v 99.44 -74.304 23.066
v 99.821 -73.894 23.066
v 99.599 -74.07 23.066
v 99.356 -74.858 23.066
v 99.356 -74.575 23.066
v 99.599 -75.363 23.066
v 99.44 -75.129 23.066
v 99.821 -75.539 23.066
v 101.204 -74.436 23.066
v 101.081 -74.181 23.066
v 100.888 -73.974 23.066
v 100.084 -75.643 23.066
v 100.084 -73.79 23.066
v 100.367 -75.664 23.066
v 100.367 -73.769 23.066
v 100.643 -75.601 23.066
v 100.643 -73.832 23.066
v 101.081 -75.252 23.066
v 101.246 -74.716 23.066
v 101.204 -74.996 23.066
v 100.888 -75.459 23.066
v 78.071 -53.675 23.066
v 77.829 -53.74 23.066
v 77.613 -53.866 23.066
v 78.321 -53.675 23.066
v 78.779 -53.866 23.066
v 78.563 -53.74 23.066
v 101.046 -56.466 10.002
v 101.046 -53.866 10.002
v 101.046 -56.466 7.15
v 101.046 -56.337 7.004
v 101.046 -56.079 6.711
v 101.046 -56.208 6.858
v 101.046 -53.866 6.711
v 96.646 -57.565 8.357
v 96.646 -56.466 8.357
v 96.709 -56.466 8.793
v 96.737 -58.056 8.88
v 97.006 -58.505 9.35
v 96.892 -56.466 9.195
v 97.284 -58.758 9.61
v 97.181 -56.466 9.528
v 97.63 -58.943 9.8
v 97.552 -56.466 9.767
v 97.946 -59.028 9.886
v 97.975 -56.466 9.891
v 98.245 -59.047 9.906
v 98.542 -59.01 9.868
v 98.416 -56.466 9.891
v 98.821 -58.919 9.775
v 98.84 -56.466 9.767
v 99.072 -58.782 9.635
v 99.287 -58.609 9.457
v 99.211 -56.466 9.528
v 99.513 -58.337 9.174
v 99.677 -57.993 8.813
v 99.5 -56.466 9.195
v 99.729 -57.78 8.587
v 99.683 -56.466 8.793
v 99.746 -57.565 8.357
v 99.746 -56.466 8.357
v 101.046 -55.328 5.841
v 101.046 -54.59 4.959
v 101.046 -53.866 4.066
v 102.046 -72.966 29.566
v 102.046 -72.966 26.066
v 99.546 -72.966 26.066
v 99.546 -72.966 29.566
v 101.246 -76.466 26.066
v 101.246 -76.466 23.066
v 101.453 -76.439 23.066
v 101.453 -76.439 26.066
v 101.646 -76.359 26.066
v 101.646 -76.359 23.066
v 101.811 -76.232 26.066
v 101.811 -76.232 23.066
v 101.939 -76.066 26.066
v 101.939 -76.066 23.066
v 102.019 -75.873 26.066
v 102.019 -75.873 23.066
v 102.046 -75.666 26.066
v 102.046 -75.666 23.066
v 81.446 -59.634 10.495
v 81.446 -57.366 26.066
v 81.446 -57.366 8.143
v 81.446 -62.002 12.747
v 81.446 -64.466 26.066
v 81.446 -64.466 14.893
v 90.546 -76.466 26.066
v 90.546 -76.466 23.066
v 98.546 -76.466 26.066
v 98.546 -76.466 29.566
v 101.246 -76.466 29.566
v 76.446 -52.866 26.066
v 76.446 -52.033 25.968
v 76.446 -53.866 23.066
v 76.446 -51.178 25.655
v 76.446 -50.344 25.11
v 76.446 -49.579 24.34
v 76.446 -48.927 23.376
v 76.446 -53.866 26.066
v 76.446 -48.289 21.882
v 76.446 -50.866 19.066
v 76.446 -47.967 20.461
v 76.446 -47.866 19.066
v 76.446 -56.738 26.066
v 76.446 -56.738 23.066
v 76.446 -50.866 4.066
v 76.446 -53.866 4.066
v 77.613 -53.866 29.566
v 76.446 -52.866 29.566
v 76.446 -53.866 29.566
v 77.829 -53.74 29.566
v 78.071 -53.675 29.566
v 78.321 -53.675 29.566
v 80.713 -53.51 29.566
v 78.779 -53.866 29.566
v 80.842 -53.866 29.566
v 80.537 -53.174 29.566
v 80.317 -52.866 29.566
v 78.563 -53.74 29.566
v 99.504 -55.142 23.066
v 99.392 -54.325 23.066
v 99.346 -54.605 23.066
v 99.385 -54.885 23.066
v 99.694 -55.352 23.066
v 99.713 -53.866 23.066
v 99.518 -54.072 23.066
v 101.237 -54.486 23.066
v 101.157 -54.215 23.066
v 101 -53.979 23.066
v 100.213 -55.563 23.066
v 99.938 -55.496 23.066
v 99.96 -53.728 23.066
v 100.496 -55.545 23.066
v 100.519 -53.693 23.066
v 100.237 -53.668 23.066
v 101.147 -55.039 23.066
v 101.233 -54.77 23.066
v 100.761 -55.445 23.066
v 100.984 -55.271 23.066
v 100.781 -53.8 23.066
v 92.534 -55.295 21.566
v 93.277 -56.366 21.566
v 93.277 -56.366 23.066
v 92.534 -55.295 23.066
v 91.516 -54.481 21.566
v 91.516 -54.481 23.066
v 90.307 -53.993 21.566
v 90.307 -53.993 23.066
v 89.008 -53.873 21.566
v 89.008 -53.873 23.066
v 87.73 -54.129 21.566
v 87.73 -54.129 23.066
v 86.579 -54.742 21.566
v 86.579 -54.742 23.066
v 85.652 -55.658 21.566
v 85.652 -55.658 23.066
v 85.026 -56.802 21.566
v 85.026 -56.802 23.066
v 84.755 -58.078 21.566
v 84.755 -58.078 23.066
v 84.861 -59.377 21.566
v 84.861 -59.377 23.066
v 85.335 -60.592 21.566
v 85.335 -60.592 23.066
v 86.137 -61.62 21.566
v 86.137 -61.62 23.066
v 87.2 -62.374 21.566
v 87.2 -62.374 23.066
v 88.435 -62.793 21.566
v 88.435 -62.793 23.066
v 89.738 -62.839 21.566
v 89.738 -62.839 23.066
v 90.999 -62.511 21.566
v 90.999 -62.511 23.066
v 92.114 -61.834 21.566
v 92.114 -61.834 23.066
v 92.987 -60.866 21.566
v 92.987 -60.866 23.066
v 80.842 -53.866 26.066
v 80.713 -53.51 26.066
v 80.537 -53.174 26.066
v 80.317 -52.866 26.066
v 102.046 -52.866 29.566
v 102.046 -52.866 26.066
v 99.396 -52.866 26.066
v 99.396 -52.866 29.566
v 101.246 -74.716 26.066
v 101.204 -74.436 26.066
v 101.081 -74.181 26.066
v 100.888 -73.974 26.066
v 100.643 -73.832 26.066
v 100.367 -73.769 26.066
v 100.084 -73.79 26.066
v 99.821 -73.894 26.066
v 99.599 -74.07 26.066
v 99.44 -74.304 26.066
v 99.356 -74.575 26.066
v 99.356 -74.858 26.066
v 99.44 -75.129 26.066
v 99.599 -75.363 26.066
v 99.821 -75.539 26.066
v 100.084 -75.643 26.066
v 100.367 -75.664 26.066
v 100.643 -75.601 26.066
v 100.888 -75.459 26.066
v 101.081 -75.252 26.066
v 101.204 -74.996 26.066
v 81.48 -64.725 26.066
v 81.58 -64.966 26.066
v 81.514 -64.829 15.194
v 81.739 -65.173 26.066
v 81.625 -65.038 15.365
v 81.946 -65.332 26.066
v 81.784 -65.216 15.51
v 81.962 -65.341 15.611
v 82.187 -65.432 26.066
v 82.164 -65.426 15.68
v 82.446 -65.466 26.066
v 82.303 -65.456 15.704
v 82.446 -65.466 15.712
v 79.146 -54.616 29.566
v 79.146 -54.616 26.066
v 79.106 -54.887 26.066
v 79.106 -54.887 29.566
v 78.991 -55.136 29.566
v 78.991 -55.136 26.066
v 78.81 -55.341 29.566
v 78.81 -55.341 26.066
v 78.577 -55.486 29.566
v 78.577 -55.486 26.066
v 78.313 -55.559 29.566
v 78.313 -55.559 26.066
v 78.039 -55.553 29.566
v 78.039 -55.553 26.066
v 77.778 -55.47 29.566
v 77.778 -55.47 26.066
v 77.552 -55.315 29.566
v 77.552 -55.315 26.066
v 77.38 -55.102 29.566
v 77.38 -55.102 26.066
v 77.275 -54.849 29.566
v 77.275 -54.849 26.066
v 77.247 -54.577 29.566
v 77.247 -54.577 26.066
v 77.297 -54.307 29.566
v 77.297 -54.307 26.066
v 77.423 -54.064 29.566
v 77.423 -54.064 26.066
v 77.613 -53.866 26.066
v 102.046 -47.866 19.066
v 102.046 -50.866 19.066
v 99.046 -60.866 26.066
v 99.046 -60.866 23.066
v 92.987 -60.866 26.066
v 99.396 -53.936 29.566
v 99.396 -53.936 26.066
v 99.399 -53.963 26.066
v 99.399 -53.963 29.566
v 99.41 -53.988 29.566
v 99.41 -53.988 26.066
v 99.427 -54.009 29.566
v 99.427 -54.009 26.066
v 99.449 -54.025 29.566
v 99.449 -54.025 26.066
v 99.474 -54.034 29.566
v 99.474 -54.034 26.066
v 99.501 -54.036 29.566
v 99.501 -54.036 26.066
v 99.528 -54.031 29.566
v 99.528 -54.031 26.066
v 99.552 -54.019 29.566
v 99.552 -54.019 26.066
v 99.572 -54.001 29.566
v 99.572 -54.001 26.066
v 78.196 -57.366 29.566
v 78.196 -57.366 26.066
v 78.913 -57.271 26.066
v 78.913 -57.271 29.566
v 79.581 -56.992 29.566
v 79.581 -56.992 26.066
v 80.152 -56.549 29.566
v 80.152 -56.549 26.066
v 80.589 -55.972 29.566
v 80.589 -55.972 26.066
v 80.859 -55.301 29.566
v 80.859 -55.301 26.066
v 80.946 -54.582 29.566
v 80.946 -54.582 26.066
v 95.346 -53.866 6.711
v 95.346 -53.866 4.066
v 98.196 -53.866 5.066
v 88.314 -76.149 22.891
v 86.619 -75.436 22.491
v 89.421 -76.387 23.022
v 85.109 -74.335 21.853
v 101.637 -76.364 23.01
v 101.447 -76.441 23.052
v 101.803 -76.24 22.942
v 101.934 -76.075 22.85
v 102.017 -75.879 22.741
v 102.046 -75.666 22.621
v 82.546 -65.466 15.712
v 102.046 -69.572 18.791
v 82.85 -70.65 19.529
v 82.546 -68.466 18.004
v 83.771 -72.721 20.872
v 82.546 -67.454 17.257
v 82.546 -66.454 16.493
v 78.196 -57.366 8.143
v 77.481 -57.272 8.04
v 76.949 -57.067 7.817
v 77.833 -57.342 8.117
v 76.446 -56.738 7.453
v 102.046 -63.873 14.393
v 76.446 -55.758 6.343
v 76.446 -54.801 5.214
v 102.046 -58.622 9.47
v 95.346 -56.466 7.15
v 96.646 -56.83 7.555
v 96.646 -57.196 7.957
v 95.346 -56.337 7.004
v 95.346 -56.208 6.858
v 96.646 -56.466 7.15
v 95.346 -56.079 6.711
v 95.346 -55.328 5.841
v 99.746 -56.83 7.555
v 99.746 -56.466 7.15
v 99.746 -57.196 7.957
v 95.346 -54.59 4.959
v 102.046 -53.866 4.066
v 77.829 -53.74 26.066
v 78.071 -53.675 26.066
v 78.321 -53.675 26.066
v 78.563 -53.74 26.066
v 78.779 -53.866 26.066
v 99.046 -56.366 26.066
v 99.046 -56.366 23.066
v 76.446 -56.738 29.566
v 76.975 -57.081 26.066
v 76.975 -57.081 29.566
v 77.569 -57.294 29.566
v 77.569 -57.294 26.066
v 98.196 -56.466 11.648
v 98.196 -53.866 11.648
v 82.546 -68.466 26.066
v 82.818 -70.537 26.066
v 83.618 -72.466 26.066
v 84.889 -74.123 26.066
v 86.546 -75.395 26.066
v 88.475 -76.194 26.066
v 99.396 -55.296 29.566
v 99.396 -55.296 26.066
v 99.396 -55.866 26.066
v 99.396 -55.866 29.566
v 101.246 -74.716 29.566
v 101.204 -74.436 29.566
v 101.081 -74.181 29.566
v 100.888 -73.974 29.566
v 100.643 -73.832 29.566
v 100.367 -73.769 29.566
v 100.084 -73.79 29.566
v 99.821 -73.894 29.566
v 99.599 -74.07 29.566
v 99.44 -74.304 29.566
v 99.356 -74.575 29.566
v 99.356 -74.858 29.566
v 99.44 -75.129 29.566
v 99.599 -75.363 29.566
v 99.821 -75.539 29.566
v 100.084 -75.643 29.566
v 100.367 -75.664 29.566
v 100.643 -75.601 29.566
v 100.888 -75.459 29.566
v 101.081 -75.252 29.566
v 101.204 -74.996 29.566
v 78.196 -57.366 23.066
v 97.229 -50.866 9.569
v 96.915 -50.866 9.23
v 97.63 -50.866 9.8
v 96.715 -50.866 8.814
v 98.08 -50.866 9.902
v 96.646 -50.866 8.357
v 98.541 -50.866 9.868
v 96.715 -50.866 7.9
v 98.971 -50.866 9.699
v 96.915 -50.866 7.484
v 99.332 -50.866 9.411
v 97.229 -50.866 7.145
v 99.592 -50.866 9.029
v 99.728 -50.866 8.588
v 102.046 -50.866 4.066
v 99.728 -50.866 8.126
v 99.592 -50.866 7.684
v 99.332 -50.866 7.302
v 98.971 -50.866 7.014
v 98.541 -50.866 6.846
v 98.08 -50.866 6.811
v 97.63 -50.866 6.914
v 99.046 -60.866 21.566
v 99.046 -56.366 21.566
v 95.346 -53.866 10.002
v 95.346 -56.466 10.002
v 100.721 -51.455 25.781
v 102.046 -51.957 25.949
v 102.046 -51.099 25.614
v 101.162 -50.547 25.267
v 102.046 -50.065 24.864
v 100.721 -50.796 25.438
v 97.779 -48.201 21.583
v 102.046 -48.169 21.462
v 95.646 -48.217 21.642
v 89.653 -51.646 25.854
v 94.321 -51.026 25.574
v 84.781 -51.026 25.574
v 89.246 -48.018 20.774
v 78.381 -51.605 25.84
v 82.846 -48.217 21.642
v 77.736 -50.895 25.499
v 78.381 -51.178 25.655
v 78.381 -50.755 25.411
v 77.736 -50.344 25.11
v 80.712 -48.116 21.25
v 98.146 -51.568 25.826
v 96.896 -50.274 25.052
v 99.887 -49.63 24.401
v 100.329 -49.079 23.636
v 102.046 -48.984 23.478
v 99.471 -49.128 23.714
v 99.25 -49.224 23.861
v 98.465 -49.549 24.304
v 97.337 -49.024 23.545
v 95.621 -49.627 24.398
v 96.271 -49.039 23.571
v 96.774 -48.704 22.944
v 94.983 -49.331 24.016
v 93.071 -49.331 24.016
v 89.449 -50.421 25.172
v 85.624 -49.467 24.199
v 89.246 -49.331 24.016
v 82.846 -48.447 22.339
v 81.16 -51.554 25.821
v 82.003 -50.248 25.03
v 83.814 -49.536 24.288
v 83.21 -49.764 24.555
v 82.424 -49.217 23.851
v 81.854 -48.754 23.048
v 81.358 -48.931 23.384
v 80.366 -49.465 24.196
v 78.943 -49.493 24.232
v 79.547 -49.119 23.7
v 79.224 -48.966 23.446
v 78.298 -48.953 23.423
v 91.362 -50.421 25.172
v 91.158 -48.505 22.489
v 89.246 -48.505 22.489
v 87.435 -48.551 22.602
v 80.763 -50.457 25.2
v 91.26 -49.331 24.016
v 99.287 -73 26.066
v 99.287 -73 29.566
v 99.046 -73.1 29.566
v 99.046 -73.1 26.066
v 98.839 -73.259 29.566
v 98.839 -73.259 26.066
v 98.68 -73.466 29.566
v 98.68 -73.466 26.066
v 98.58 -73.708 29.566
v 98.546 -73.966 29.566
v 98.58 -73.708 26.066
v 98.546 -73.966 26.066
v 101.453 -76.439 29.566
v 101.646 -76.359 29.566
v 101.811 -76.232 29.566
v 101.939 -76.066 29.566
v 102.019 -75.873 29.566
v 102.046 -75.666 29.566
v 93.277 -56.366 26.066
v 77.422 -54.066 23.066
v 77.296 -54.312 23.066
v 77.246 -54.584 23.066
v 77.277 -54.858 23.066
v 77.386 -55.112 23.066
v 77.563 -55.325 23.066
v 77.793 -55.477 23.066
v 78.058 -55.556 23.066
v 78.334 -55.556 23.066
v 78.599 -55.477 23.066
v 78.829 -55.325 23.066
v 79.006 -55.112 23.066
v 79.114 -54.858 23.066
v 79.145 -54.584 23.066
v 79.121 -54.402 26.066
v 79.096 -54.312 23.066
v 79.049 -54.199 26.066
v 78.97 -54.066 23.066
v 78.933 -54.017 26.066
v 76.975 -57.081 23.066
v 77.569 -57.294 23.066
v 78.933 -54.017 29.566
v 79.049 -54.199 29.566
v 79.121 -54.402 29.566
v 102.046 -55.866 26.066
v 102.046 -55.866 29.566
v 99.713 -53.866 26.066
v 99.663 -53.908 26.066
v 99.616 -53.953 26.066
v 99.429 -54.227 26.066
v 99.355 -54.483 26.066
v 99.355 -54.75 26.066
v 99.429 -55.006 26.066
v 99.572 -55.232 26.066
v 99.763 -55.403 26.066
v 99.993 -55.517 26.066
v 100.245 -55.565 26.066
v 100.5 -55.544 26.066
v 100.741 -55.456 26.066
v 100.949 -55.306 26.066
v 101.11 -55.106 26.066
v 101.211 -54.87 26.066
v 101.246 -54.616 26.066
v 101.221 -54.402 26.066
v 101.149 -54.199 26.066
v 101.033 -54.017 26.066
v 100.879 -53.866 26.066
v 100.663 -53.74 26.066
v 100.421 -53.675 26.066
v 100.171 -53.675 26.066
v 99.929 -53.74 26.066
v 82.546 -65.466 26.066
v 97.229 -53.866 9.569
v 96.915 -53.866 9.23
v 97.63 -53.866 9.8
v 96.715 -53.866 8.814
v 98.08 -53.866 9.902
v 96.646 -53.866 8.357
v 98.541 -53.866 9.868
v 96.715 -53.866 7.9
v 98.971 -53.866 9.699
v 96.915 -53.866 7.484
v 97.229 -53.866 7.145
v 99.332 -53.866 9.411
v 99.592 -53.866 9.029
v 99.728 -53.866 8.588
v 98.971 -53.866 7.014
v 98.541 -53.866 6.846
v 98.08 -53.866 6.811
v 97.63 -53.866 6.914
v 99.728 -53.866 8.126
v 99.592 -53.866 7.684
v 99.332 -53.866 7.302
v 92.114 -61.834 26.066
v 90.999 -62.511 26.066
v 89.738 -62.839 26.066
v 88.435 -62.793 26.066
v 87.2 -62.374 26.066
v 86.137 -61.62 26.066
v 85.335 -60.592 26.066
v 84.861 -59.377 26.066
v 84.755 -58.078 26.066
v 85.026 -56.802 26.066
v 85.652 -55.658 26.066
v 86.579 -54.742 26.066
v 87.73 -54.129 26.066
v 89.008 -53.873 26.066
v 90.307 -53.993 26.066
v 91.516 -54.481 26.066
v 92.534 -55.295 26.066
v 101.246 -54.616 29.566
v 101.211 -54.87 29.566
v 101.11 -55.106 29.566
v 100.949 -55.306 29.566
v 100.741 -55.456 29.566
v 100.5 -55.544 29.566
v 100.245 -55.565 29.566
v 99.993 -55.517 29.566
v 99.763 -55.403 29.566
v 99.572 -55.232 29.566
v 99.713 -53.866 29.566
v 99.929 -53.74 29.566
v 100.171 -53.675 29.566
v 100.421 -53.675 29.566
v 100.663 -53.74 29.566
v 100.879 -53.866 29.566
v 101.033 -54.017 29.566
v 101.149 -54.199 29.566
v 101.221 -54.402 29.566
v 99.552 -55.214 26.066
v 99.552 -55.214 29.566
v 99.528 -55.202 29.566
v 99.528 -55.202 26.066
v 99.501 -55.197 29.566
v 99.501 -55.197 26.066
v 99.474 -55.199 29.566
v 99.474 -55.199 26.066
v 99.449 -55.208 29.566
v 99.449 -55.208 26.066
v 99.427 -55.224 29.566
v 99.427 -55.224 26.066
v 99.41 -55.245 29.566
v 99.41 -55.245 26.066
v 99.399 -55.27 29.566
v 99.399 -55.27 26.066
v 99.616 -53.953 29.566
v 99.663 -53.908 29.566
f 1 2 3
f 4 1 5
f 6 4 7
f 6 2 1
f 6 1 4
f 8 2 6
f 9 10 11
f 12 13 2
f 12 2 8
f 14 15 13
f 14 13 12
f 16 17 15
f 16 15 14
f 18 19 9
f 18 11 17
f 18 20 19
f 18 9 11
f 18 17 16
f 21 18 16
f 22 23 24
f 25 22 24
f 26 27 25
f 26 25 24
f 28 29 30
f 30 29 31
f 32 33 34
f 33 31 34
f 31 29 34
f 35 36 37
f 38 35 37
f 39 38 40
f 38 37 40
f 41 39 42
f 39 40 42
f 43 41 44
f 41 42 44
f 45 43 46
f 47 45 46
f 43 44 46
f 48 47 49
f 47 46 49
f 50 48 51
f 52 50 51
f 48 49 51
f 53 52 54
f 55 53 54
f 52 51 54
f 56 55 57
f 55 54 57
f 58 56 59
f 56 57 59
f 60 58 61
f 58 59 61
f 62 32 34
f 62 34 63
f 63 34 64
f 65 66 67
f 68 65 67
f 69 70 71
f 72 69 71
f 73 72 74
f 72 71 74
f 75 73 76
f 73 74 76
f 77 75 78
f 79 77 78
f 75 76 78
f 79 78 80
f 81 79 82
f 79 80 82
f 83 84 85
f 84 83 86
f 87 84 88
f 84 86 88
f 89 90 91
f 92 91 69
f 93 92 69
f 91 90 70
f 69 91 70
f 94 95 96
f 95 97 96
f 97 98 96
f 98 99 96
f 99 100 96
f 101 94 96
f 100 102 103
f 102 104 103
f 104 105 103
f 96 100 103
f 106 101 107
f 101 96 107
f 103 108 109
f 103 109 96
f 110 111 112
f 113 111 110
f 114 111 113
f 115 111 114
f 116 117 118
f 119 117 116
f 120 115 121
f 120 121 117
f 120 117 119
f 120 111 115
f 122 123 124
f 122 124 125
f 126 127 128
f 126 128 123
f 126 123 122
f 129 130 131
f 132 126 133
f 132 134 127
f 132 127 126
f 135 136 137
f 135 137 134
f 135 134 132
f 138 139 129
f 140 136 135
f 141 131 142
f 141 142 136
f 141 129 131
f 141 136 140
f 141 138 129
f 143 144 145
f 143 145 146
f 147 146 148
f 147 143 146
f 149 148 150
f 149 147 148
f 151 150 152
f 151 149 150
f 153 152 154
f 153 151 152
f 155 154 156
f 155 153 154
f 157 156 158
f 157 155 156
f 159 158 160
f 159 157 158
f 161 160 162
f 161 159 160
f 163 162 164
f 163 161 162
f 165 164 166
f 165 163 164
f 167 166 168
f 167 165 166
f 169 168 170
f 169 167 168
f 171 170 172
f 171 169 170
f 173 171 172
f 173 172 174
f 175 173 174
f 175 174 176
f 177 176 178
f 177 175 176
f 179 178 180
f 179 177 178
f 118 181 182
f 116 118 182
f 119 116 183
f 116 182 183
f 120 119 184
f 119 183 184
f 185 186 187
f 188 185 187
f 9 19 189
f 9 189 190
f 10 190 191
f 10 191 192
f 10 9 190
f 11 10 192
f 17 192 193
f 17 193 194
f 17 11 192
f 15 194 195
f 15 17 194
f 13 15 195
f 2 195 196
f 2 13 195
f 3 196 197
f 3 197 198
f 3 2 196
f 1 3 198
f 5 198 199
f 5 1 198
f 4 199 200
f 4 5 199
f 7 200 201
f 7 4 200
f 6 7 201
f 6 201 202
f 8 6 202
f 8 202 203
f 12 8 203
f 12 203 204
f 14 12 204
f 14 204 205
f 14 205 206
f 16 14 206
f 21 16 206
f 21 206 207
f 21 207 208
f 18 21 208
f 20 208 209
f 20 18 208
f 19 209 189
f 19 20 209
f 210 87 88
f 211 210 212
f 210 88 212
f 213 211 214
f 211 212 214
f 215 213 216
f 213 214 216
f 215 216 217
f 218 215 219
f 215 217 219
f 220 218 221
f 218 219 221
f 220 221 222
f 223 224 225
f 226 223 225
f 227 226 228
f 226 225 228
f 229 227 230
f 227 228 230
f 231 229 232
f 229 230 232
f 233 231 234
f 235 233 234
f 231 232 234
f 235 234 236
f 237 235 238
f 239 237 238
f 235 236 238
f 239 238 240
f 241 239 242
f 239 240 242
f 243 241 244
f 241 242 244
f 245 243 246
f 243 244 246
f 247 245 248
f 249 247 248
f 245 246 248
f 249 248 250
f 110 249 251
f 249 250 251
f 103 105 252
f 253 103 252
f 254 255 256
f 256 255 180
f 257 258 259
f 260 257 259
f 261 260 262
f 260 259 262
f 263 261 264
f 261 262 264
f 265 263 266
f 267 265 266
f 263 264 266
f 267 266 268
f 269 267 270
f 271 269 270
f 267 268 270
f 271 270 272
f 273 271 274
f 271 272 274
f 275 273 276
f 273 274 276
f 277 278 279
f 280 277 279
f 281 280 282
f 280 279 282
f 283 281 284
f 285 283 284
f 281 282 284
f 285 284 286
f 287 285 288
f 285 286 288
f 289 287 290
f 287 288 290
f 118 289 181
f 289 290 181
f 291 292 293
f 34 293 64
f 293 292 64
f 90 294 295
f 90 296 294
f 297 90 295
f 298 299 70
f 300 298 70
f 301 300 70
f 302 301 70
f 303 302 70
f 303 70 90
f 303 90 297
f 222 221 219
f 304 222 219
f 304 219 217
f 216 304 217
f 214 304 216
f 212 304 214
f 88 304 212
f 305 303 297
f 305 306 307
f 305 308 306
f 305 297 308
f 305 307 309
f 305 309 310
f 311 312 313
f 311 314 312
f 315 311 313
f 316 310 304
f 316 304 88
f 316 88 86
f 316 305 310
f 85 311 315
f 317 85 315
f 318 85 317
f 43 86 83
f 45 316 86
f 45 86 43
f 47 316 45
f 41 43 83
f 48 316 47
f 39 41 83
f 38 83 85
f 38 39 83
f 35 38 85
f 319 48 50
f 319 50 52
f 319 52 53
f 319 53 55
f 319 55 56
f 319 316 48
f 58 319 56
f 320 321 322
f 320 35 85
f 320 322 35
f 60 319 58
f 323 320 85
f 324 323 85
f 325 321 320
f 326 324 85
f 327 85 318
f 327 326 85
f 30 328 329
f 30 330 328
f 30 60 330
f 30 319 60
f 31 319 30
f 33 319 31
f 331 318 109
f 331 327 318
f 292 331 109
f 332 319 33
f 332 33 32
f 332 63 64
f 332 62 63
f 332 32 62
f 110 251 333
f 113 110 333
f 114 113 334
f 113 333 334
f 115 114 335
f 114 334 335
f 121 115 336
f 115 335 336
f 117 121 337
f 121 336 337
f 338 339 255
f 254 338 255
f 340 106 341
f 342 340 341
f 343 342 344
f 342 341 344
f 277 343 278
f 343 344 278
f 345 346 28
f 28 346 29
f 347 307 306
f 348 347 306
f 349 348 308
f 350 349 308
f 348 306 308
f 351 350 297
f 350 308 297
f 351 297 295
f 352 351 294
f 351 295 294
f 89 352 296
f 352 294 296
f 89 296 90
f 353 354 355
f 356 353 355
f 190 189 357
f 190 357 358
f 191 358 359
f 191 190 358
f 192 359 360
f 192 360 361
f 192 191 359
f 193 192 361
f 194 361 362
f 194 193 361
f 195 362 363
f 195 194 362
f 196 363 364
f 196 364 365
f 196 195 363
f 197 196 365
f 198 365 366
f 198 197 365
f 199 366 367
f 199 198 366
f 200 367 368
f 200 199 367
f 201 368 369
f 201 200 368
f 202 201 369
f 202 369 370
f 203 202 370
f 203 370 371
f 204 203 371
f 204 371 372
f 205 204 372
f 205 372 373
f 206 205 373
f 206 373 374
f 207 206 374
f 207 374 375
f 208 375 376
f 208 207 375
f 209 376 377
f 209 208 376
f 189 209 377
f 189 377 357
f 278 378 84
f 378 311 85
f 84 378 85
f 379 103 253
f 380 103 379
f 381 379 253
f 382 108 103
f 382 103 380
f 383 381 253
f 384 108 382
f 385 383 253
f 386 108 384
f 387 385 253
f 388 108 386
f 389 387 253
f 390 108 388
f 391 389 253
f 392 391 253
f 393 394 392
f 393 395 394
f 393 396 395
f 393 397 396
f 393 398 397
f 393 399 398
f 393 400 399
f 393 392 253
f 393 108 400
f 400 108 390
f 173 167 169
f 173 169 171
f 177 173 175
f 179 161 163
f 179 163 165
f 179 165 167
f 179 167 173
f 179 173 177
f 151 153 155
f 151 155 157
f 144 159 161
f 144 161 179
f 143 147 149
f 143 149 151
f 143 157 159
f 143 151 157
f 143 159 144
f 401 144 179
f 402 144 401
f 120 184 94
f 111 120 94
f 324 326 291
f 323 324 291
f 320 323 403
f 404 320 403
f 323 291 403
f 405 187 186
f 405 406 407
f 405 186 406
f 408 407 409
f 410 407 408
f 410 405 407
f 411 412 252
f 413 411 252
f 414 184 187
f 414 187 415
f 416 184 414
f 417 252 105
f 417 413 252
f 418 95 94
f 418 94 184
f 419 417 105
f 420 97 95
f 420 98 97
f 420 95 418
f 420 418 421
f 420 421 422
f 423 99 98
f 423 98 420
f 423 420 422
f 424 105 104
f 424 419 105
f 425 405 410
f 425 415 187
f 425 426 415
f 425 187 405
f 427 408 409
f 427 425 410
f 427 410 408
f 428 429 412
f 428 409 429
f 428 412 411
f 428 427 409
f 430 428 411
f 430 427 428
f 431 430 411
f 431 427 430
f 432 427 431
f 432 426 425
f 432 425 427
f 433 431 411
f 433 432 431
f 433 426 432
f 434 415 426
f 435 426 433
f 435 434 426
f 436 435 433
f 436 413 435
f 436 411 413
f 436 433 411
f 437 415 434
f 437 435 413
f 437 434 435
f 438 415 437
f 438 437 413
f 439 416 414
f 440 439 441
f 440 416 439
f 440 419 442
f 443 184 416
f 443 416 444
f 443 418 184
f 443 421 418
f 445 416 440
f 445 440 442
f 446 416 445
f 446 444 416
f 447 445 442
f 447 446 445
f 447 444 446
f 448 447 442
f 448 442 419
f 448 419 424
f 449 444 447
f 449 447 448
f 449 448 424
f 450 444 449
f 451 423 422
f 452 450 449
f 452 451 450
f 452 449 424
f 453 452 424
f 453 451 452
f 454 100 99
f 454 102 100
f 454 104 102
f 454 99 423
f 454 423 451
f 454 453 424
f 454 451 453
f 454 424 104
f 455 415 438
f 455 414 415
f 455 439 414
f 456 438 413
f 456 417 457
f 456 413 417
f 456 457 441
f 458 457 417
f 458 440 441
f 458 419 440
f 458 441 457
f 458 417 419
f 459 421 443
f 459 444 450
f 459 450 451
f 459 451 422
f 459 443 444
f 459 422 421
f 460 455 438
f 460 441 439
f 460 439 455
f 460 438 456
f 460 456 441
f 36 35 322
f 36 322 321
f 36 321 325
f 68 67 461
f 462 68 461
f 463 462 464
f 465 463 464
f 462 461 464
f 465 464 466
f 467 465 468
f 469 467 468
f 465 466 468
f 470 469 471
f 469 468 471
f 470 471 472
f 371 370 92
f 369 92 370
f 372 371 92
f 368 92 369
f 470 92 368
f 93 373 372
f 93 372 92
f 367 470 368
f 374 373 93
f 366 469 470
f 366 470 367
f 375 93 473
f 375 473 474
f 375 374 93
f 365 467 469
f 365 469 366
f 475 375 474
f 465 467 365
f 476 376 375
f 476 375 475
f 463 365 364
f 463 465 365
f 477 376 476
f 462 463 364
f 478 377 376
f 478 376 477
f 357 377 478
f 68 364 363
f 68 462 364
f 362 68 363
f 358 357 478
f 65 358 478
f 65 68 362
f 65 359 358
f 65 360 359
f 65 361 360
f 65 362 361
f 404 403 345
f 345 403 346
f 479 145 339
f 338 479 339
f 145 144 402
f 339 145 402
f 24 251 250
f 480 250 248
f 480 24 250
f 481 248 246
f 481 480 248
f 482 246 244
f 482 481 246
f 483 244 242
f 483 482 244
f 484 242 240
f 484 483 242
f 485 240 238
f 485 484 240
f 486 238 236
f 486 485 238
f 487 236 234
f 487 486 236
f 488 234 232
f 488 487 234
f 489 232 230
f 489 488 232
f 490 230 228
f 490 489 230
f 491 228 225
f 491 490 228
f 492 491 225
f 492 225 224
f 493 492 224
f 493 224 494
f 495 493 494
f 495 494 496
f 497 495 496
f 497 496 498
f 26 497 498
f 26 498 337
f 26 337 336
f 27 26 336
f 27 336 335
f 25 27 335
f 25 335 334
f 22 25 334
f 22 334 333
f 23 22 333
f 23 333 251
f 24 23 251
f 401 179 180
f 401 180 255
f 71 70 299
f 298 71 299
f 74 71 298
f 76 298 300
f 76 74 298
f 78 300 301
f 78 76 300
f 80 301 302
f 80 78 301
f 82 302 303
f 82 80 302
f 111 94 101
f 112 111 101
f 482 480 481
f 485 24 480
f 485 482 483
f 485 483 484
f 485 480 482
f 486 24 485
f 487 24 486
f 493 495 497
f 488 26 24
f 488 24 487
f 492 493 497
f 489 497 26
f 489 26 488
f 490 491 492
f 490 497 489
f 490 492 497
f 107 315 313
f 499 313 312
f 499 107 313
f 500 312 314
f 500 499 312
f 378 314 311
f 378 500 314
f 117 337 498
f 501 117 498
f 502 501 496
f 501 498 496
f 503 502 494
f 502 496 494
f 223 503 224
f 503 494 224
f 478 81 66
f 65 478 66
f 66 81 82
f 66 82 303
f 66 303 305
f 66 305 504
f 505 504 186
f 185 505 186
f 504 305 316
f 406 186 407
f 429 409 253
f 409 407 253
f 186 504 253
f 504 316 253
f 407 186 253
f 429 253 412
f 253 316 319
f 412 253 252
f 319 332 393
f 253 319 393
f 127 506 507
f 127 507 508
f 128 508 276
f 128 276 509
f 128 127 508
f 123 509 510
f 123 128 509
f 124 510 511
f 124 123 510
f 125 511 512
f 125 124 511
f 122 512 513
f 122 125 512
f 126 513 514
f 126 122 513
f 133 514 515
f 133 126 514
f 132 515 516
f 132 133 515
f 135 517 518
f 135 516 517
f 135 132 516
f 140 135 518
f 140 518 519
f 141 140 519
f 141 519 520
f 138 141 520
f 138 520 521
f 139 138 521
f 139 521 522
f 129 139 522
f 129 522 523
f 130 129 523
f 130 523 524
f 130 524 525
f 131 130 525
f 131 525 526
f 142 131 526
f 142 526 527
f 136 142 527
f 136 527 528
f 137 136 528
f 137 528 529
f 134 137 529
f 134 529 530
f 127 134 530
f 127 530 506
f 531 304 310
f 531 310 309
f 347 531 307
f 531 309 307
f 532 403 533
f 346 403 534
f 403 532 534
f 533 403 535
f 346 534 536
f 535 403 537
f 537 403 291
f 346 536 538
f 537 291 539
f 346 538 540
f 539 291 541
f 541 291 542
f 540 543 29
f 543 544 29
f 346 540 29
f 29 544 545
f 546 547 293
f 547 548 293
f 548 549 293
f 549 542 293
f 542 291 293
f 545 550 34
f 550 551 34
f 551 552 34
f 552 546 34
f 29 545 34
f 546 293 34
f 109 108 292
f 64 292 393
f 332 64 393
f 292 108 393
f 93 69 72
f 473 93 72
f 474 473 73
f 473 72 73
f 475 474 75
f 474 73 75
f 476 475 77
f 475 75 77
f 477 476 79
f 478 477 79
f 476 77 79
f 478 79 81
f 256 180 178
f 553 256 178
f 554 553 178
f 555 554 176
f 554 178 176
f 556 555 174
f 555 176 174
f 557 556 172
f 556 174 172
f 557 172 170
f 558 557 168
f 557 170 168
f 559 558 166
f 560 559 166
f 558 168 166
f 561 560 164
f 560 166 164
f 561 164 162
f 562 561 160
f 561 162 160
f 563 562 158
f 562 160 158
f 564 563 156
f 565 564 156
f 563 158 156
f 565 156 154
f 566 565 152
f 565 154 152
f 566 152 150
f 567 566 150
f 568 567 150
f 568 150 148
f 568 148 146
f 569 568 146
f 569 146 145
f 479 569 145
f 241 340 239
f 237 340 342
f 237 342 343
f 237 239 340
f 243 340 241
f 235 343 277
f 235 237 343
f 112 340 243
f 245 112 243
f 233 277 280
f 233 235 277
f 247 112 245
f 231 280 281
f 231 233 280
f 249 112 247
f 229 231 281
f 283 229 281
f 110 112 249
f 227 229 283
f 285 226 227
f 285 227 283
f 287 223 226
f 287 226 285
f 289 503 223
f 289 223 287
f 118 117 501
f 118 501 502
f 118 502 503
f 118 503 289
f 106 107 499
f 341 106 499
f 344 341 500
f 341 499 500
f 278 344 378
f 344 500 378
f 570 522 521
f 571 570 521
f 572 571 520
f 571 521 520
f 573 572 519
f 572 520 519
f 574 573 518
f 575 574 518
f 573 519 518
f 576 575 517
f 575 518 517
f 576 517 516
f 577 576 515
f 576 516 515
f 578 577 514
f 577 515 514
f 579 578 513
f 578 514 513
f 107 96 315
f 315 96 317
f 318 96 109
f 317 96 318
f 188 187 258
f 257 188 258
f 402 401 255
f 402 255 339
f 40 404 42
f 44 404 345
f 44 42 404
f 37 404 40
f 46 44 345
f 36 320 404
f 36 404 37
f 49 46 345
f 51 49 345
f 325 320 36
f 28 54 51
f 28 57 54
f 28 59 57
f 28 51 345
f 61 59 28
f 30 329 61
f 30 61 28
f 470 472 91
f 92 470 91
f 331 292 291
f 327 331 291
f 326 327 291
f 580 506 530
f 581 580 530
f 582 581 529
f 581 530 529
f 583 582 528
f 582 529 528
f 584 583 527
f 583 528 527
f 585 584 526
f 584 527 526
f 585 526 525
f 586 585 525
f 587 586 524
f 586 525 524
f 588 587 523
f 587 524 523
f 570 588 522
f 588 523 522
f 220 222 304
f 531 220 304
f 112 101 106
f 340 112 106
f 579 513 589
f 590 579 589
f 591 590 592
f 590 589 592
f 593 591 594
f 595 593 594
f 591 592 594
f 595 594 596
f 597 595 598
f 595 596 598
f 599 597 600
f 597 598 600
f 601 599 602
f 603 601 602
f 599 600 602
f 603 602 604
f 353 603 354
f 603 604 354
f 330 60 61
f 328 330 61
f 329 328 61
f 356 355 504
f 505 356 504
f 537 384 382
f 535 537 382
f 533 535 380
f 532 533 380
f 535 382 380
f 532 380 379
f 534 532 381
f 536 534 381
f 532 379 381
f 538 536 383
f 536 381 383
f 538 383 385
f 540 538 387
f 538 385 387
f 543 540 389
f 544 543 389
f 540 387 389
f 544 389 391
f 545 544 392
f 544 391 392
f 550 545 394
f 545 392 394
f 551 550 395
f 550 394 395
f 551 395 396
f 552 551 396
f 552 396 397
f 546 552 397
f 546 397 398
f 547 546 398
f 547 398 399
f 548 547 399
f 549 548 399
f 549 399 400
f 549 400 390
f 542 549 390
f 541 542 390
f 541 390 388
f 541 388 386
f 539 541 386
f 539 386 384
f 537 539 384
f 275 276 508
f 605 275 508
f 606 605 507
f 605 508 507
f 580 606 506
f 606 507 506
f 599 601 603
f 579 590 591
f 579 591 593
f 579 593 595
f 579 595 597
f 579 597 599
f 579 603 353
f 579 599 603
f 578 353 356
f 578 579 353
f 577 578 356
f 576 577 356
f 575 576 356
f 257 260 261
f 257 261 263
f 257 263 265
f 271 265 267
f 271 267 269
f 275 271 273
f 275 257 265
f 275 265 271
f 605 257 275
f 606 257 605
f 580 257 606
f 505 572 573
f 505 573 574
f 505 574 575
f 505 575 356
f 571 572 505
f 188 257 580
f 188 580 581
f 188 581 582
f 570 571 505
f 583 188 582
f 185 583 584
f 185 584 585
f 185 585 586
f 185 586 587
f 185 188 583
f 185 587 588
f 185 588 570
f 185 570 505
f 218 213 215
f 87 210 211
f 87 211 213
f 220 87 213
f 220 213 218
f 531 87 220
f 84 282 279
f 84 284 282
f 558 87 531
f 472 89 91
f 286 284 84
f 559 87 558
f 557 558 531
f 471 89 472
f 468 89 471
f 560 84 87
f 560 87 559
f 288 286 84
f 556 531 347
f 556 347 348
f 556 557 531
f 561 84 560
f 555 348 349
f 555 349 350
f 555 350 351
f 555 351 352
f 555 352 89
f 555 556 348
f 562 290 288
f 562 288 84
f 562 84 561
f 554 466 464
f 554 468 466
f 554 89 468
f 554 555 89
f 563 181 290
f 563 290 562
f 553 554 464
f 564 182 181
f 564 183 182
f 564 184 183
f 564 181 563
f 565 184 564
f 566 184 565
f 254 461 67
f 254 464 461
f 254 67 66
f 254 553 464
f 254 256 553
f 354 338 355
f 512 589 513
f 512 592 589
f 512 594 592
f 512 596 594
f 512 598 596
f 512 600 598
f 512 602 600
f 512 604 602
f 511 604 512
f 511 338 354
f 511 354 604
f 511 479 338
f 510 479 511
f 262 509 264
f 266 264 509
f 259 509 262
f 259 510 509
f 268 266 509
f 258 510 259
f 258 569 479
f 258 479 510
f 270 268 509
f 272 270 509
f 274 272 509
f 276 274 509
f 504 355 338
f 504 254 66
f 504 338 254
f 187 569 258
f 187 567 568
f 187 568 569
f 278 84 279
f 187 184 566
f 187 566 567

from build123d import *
from build123d.topology import SkipClean

# Parameters (mm, degrees)
BOSS_EXTRUDE1_START     = -15
BOSS_EXTRUDE1_OUTLINE_W = 25.6
BOSS_EXTRUDE1_OUTLINE_H = 3
BOSS_EXTRUDE1_DEPTH     = 15
SKETCH2_4_W             = 25.6
SKETCH2_4_H             = 6
BOSS_EXTRUDE2_DEPTH     = 4
BOSS_EXTRUDE6_START     = 4
SKETCH2_6_R             = 0.95
BOSS_EXTRUDE6_DEPTH     = 3
BOSS_EXTRUDE7_START     = 7
SKETCH2_7_R             = 0.95
BOSS_EXTRUDE7_DEPTH     = 3.5
BOSS_EXTRUDE8_START     = -25.6
BOSS_EXTRUDE8_DEPTH     = 25.6
CUT_EXTRUDE1_REACH      = 130.924
CUT_EXTRUDE1_END_RADIUS = 75
CUT_EXTRUDE2_START      = -1.5
CUT_EXTRUDE2_DEPTH      = 1.5
CUT_EXTRUDE3_REACH      = 87.887
CUT_EXTRUDE4_REACH      = 111.283
CUT_EXTRUDE4_END_RADIUS = 75
SKETCH6_R               = 1.55
CUT_EXTRUDE5_START      = -3
SKETCH6_4_R             = 1.55
CUT_EXTRUDE5_DEPTH      = 2.6
CUT_EXTRUDE6_START      = -1.098342
SKETCH7_W               = 3.1
SKETCH7_H               = 1.207100643
CUT_EXTRUDE6_DEPTH      = 1.098342


# Read off the part's stored shape, not the designer's step: Boss-Extrude1
with BuildPart() as part:
    # Boss-Extrude1 outline → Boss-Extrude1 (new body)
    with BuildSketch(Plane.XY.offset(19.065792005).offset(BOSS_EXTRUDE1_START)):
        with Locations((89.245789569, -52.366374711)):
            Rectangle(BOSS_EXTRUDE1_OUTLINE_W, BOSS_EXTRUDE1_OUTLINE_H)
    extrude(amount=BOSS_EXTRUDE1_DEPTH)

    # Sketch2<4> → Boss-Extrude2 (add)
    with BuildSketch(Plane.XY.offset(19.065792005)):
        with Locations((89.245789569, -50.866374711)):
            Rectangle(SKETCH2_4_W, SKETCH2_4_H)
    extrude(amount=BOSS_EXTRUDE2_DEPTH)

    # Sketch2<6> → Boss-Extrude6 (add)
    with BuildSketch(Plane.XY.offset(19.065792005).offset(BOSS_EXTRUDE6_START)):
        with BuildLine():
            ThreePointArc((76.445789569, -56.737695055), (77.266039857, -57.204436819), (78.195789569, -57.366374711))
            Line((78.195789569, -57.366374711), (81.445789569, -57.366374711))
            Line((81.445789569, -57.366374711), (81.445789569, -64.466374711))
            ThreePointArc((81.445789569, -64.466374711), (81.738682788, -65.173481493), (82.445789569, -65.466374711))
            Line((82.445789569, -65.466374711), (82.545789569, -65.466374711))
            Line((82.545789569, -65.466374711), (82.545789569, -68.466374711))
            ThreePointArc((82.545789569, -68.466374711), (84.88893532, -74.123228961), (90.545789569, -76.466374711))
            Line((90.545789569, -76.466374711), (101.245789569, -76.466374711))
            ThreePointArc((101.245789569, -76.466374711), (101.811474994, -76.232060136), (102.045789569, -75.666374711))
            Line((102.045789569, -75.666374711), (102.045789569, -47.866374711))
            Line((102.045789569, -47.866374711), (76.445789569, -47.866374711))
            Line((76.445789569, -47.866374711), (76.445789569, -56.737695055))
        make_face()
        with Locations(Location((100.295789569, -54.616374711, 0), (0, 0, 127.863646362))):
            Circle(SKETCH2_6_R, mode=Mode.SUBTRACT)
        with Locations(Location((78.195789569, -54.616374711, 0), (0, 0, 127.863646362))):
            Circle(SKETCH2_6_R, mode=Mode.SUBTRACT)
        with BuildLine():
            Line((99.045789569, -56.366374711), (99.045789569, -60.866374711))
            Line((99.045789569, -60.866374711), (92.987446956, -60.866374711))
            ThreePointArc((92.987446956, -60.866374711), (84.75507119, -58.077500283), (93.276918444, -56.366374711))
            Line((93.276918444, -56.366374711), (99.045789569, -56.366374711))
        make_face(mode=Mode.SUBTRACT)
        with Locations((100.295789569, -74.716374711)):
            Circle(SKETCH2_6_R, mode=Mode.SUBTRACT)
    extrude(amount=BOSS_EXTRUDE6_DEPTH)

    # Sketch2<7> → Boss-Extrude7 (add)
    # profile 1 of 6: a face of its own
    with SkipClean():  # the faces are left unmerged after this step: merging them gives an invalid solid
        with BuildSketch(Plane.XY.offset(19.065792005).offset(BOSS_EXTRUDE7_START)):
            with BuildLine():
                ThreePointArc((78.195789569, -57.366374711), (80.389530666, -56.274687107), (80.84154088, -53.866374711))
                Line((80.84154088, -53.866374711), (78.778884759, -53.866374711))
                ThreePointArc((78.778884759, -53.866374711), (79.049147768, -54.198906407), (79.145789569, -54.616374711))
                ThreePointArc((79.145789569, -54.616374711), (77.778321265, -55.46973291), (77.61269438, -53.866374711))
                Line((77.61269438, -53.866374711), (76.445789569, -53.866374711))
                Line((76.445789569, -53.866374711), (76.445789569, -56.737695055))
                ThreePointArc((76.445789569, -56.737695055), (77.266039857, -57.204436819), (78.195789569, -57.366374711))
            make_face()
        # profile 2 of 6: a face of its own
        with BuildSketch(Plane.XY.offset(19.065792005).offset(BOSS_EXTRUDE7_START)):
            with BuildLine():
                Line((78.778884759, -53.866374711), (80.84154088, -53.866374711))
                ThreePointArc((80.84154088, -53.866374711), (80.631203916, -53.339168009), (80.317109913, -52.866374711))
                Line((80.317109913, -52.866374711), (76.445789569, -52.866374711))
                Line((76.445789569, -52.866374711), (76.445789569, -53.866374711))
                Line((76.445789569, -53.866374711), (77.61269438, -53.866374711))
                ThreePointArc((77.61269438, -53.866374711), (78.195789569, -53.666374711), (78.778884759, -53.866374711))
            make_face()
        # profile 3 of 6: a face of its own
        with BuildSketch(Plane.XY.offset(19.065792005).offset(BOSS_EXTRUDE7_START)):
            with BuildLine():
                Line((102.045789569, -53.866374711), (100.878884759, -53.866374711))
                ThreePointArc((100.878884759, -53.866374711), (101.149147768, -54.198906407), (101.245789569, -54.616374711))
                ThreePointArc((101.245789569, -54.616374711), (100.62357071, -55.508035815), (99.571980046, -55.23167933))
                ThreePointArc((99.571980046, -55.23167933), (99.461286291, -55.202589173), (99.395789569, -55.296448237))
                Line((99.395789569, -55.296448237), (99.395789569, -55.866374711))
                Line((99.395789569, -55.866374711), (102.045789569, -55.866374711))
                Line((102.045789569, -55.866374711), (102.045789569, -53.866374711))
            make_face()
        # profile 4 of 6: a face of its own
        with BuildSketch(Plane.XY.offset(19.065792005).offset(BOSS_EXTRUDE7_START)):
            with BuildLine():
                Line((99.395789569, -52.866374711), (99.395789569, -53.866374711))
                Line((99.395789569, -53.866374711), (99.71269438, -53.866374711))
                ThreePointArc((99.71269438, -53.866374711), (100.295789569, -53.666374711), (100.878884759, -53.866374711))
                Line((100.878884759, -53.866374711), (102.045789569, -53.866374711))
                Line((102.045789569, -53.866374711), (102.045789569, -52.866374711))
                Line((102.045789569, -52.866374711), (99.395789569, -52.866374711))
            make_face()
        # profile 5 of 6: a face of its own
        with BuildSketch(Plane.XY.offset(19.065792005).offset(BOSS_EXTRUDE7_START)):
            with BuildLine():
                Line((99.71269438, -53.866374711), (99.395789569, -53.866374711))
                Line((99.395789569, -53.866374711), (99.395789569, -53.936301186))
                ThreePointArc((99.395789569, -53.936301186), (99.461286291, -54.03016025), (99.571980046, -54.001070093))
                ThreePointArc((99.571980046, -54.001070093), (99.638875805, -53.930106319), (99.71269438, -53.866374711))
            make_face()
        # profile 6 of 6: a face of its own
        with BuildSketch(Plane.XY.offset(19.065792005).offset(BOSS_EXTRUDE7_START)):
            with BuildLine():
                Line((102.045789569, -75.666374711), (102.045789569, -72.966374711))
                Line((102.045789569, -72.966374711), (99.545789569, -72.966374711))
                ThreePointArc((99.545789569, -72.966374711), (98.838682788, -73.25926793), (98.545789569, -73.966374711))
                Line((98.545789569, -73.966374711), (98.545789569, -76.466374711))
                Line((98.545789569, -76.466374711), (101.245789569, -76.466374711))
                ThreePointArc((101.245789569, -76.466374711), (101.811474994, -76.232060136), (102.045789569, -75.666374711))
            make_face()
            with Locations((100.295789569, -74.716374711)):
                Circle(SKETCH2_7_R, mode=Mode.SUBTRACT)
        extrude(amount=BOSS_EXTRUDE7_DEPTH)

    # Sketch3 → Boss-Extrude8 (add)
    with SkipClean():  # the faces are left unmerged after this step: merging them gives an invalid solid
        with BuildSketch(Plane.ZY.offset(-76.445789569).offset(BOSS_EXTRUDE8_START)):
            with BuildLine():
                Line((4.065792005, -53.866374711), (23.065792005, -53.866374711))
                Line((23.065792005, -53.866374711), (23.065792005, -76.466374711))
                ThreePointArc((23.065792005, -76.466374711), (14.688908487, -64.22216174), (4.065792005, -53.866374711))
            make_face()
        extrude(amount=BOSS_EXTRUDE8_DEPTH)

    # Cut-Extrude1: up to this cylinder (the profile starts outside it)
    with SkipClean():  # the faces are left unmerged after this step: merging them gives an invalid solid
        cut_extrude1_end = Plane(origin=(90.860738, -112.485393056, -42.718935079), z_dir=(-1, 0, 0)) * Cylinder(CUT_EXTRUDE1_END_RADIUS, 434.860714, mode=Mode.PRIVATE)
        # Sketch4 → Cut-Extrude1 (cut, up to the surface)
        with BuildSketch(Plane.XY.offset(23.065792005), mode=Mode.PRIVATE) as cut_extrude1_sk1:
            with BuildLine():
                ThreePointArc((76.445789569, -56.737695055), (77.266039857, -57.204436819), (78.195789569, -57.366374711))
                Line((78.195789569, -57.366374711), (81.445789569, -57.366374711))
                Line((81.445789569, -57.366374711), (81.445789569, -64.466374711))
                ThreePointArc((81.445789569, -64.466374711), (81.738682788, -65.173481493), (82.445789569, -65.466374711))
                Line((82.445789569, -65.466374711), (82.545789569, -65.466374711))
                Line((82.545789569, -65.466374711), (82.545789569, -68.466374711))
                ThreePointArc((82.545789569, -68.466374711), (84.88893532, -74.123228961), (90.545789569, -76.466374711))
                Line((90.545789569, -76.466374711), (76.445789569, -76.466374711))
                Line((76.445789569, -76.466374711), (76.445789569, -56.737695055))
            make_face()
        cut_extrude1_tool1 = extrude(cut_extrude1_sk1.sketch, amount=-CUT_EXTRUDE1_REACH, mode=Mode.PRIVATE) - cut_extrude1_end
        add(cut_extrude1_tool1.solids().sort_by_distance((79.854381, -68.162333, 23.065792))[0], mode=Mode.SUBTRACT)
        # Sketch4 → Cut-Extrude1 (cut, up to the surface)
        with BuildSketch(Plane.XY.offset(23.065792005), mode=Mode.PRIVATE) as cut_extrude1_sk2:
            with BuildLine():
                ThreePointArc((101.245789569, -76.466374711), (101.811474994, -76.232060136), (102.045789569, -75.666374711))
                Line((102.045789569, -75.666374711), (102.045789569, -76.466374711))
                Line((102.045789569, -76.466374711), (101.245789569, -76.466374711))
            make_face()
        cut_extrude1_tool2 = extrude(cut_extrude1_sk2.sketch, amount=-CUT_EXTRUDE1_REACH, mode=Mode.PRIVATE) - cut_extrude1_end
        add(cut_extrude1_tool2.solids().sort_by_distance((101.867095, -76.28768, 23.065792))[0], mode=Mode.SUBTRACT)

    # Sketch4<3> → Cut-Extrude2 (cut)
    with SkipClean():  # the faces are left unmerged after this step: merging them gives an invalid solid
        with BuildSketch(Plane.XY.offset(23.065792005).offset(CUT_EXTRUDE2_START)):
            with BuildLine():
                Line((99.045789569, -60.866374711), (99.045789569, -56.366374711))
                Line((99.045789569, -56.366374711), (93.276918444, -56.366374711))
                ThreePointArc((93.276918444, -56.366374711), (84.75507119, -58.077500283), (92.987446956, -60.866374711))
                Line((92.987446956, -60.866374711), (99.045789569, -60.866374711))
            make_face()
        extrude(amount=CUT_EXTRUDE2_DEPTH, mode=Mode.SUBTRACT)

    # Cut-Extrude3: up to this face of the body (flat: up to its plane)
    cut_extrude3_end = Plane(part.part.faces().sort_by_distance((102.045789569, -60.857452704, 17.150237261))[0])
    # Sketch5 → Cut-Extrude3 (cut, up to the picked face)
    with BuildSketch(Plane.ZY.offset(-76.445789569), mode=Mode.PRIVATE) as cut_extrude3_sk1:
        with BuildLine():
            Line((19.065792005, -47.866374711), (26.065792005, -47.866374711))
            Line((26.065792005, -47.866374711), (26.065792005, -52.866374711))
            add(Edge.make_bspline(
                [(26.065792005, -52.866374711), (26.065792005, -47.866374711), (19.065792005, -47.866374711)],
                knots=[3.141592654, 3.141592654, 3.141592654, 4.71238898, 4.71238898, 4.71238898], degree=2, weights=[1, 0.707106781, 1]))
        make_face()
    cut_extrude3_tool1 = split(extrude(cut_extrude3_sk1.sketch, amount=-CUT_EXTRUDE3_REACH, mode=Mode.PRIVATE), bisect_by=cut_extrude3_end, keep=Keep.BOTH, mode=Mode.PRIVATE)
    add(cut_extrude3_tool1.solids().sort_by(Axis((76.44579, -48.983214, 24.502216), (1, 0, 0)))[0], mode=Mode.SUBTRACT)

    # Cut-Extrude4: up to this cylinder (the profile starts outside it)
    with SkipClean():  # the faces are left unmerged after this step: merging them gives an invalid solid
        cut_extrude4_end = Plane(origin=(113.9359425, -112.485393056, -42.718935079), z_dir=(-1, 0, 0)) * Cylinder(CUT_EXTRUDE4_END_RADIUS, 405.046305, mode=Mode.PRIVATE)
        # Sketch6 → Cut-Extrude4 (cut, up to the surface)
        with BuildSketch(Plane(origin=(0, -50.866374711, 0), x_dir=(1, 0, 0), z_dir=(0, 1, 0)), mode=Mode.PRIVATE) as cut_extrude4_sk1:
            with Locations((129.676095042, -14.774895471)):
                Circle(SKETCH6_R)
        cut_extrude4_tool1 = extrude(cut_extrude4_sk1.sketch, amount=-CUT_EXTRUDE4_REACH, mode=Mode.PRIVATE) - cut_extrude4_end
        add(cut_extrude4_tool1.solids().sort_by_distance((129.676095, -50.866375, 14.774895))[0], mode=Mode.SUBTRACT)
        # Sketch6 → Cut-Extrude4 (cut, up to the surface)
        with BuildSketch(Plane(origin=(0, -50.866374711, 0), x_dir=(1, 0, 0), z_dir=(0, 1, 0)), mode=Mode.PRIVATE) as cut_extrude4_sk2:
            with Locations(Location((98.195789569, -8.356688539, 0), (0, 0, 180))):
                Circle(SKETCH6_R)
        cut_extrude4_tool2 = extrude(cut_extrude4_sk2.sketch, amount=-CUT_EXTRUDE4_REACH, mode=Mode.PRIVATE) - cut_extrude4_end
        add(cut_extrude4_tool2.solids().sort_by_distance((98.19579, -50.866375, 8.356689))[0], mode=Mode.SUBTRACT)

    # Sketch6<4> → Cut-Extrude5 (cut)
    # profile 1 of 4: a face of its own
    with SkipClean():  # the faces are left unmerged after this step: merging them gives an invalid solid
        with BuildSketch(Plane(origin=(0, -50.866374711, 0), x_dir=(1, 0, 0), z_dir=(0, 1, 0)).offset(CUT_EXTRUDE5_START)):
            Polygon((132.526095042, -13.129447203), (129.676095042, -11.483998936), (126.826095042, -13.129447203), (126.826095042, -16.420343738), (129.676095042, -18.065792005), (132.526095042, -16.420343738), align=None)
            with Locations((129.676095042, -14.774895471)):
                Circle(SKETCH6_4_R, mode=Mode.SUBTRACT)
        # profile 2 of 4: a face of its own
        with BuildSketch(Plane(origin=(0, -50.866374711, 0), x_dir=(1, 0, 0), z_dir=(0, 1, 0)).offset(CUT_EXTRUDE5_START)):
            Polygon((126.826095042, -13.129447203), (129.676095042, -11.483998936), (132.526095042, -13.129447203), (132.526095042, -4.065792005), (126.826095042, -4.065792005), align=None)
        # profile 3 of 4: a face of its own
        with BuildSketch(Plane(origin=(0, -50.866374711, 0), x_dir=(1, 0, 0), z_dir=(0, 1, 0)).offset(CUT_EXTRUDE5_START)):
            Polygon((101.045789569, -6.711240272), (98.195789569, -5.065792005), (95.345789569, -6.711240272), (95.345789569, -10.002136807), (98.195789569, -11.647585074), (101.045789569, -10.002136807), align=None)
            with Locations(Location((98.195789569, -8.356688539, 0), (0, 0, 180))):
                Circle(SKETCH6_4_R, mode=Mode.SUBTRACT)
        # profile 4 of 4: a face of its own
        with BuildSketch(Plane(origin=(0, -50.866374711, 0), x_dir=(1, 0, 0), z_dir=(0, 1, 0)).offset(CUT_EXTRUDE5_START)):
            Polygon((95.345789569, -6.711240272), (98.195789569, -5.065792005), (101.045789569, -6.711240272), (101.045789569, -4.065792005), (95.345789569, -4.065792005), align=None)
        extrude(amount=-CUT_EXTRUDE5_DEPTH, mode=Mode.SUBTRACT)

    # Sketch7 → Cut-Extrude6 (cut)
    with SkipClean():  # the faces are left unmerged after this step: merging them gives an invalid solid
        with BuildSketch(Plane(origin=(0, -56.466374711, 0), x_dir=(1, 0, 0), z_dir=(0, 1, 0)).offset(CUT_EXTRUDE6_START)):
            with Locations((98.195789569, -7.753138218)):
                Rectangle(SKETCH7_W, SKETCH7_H)
        extrude(amount=CUT_EXTRUDE6_DEPTH, mode=Mode.SUBTRACT)


solid = part.part
